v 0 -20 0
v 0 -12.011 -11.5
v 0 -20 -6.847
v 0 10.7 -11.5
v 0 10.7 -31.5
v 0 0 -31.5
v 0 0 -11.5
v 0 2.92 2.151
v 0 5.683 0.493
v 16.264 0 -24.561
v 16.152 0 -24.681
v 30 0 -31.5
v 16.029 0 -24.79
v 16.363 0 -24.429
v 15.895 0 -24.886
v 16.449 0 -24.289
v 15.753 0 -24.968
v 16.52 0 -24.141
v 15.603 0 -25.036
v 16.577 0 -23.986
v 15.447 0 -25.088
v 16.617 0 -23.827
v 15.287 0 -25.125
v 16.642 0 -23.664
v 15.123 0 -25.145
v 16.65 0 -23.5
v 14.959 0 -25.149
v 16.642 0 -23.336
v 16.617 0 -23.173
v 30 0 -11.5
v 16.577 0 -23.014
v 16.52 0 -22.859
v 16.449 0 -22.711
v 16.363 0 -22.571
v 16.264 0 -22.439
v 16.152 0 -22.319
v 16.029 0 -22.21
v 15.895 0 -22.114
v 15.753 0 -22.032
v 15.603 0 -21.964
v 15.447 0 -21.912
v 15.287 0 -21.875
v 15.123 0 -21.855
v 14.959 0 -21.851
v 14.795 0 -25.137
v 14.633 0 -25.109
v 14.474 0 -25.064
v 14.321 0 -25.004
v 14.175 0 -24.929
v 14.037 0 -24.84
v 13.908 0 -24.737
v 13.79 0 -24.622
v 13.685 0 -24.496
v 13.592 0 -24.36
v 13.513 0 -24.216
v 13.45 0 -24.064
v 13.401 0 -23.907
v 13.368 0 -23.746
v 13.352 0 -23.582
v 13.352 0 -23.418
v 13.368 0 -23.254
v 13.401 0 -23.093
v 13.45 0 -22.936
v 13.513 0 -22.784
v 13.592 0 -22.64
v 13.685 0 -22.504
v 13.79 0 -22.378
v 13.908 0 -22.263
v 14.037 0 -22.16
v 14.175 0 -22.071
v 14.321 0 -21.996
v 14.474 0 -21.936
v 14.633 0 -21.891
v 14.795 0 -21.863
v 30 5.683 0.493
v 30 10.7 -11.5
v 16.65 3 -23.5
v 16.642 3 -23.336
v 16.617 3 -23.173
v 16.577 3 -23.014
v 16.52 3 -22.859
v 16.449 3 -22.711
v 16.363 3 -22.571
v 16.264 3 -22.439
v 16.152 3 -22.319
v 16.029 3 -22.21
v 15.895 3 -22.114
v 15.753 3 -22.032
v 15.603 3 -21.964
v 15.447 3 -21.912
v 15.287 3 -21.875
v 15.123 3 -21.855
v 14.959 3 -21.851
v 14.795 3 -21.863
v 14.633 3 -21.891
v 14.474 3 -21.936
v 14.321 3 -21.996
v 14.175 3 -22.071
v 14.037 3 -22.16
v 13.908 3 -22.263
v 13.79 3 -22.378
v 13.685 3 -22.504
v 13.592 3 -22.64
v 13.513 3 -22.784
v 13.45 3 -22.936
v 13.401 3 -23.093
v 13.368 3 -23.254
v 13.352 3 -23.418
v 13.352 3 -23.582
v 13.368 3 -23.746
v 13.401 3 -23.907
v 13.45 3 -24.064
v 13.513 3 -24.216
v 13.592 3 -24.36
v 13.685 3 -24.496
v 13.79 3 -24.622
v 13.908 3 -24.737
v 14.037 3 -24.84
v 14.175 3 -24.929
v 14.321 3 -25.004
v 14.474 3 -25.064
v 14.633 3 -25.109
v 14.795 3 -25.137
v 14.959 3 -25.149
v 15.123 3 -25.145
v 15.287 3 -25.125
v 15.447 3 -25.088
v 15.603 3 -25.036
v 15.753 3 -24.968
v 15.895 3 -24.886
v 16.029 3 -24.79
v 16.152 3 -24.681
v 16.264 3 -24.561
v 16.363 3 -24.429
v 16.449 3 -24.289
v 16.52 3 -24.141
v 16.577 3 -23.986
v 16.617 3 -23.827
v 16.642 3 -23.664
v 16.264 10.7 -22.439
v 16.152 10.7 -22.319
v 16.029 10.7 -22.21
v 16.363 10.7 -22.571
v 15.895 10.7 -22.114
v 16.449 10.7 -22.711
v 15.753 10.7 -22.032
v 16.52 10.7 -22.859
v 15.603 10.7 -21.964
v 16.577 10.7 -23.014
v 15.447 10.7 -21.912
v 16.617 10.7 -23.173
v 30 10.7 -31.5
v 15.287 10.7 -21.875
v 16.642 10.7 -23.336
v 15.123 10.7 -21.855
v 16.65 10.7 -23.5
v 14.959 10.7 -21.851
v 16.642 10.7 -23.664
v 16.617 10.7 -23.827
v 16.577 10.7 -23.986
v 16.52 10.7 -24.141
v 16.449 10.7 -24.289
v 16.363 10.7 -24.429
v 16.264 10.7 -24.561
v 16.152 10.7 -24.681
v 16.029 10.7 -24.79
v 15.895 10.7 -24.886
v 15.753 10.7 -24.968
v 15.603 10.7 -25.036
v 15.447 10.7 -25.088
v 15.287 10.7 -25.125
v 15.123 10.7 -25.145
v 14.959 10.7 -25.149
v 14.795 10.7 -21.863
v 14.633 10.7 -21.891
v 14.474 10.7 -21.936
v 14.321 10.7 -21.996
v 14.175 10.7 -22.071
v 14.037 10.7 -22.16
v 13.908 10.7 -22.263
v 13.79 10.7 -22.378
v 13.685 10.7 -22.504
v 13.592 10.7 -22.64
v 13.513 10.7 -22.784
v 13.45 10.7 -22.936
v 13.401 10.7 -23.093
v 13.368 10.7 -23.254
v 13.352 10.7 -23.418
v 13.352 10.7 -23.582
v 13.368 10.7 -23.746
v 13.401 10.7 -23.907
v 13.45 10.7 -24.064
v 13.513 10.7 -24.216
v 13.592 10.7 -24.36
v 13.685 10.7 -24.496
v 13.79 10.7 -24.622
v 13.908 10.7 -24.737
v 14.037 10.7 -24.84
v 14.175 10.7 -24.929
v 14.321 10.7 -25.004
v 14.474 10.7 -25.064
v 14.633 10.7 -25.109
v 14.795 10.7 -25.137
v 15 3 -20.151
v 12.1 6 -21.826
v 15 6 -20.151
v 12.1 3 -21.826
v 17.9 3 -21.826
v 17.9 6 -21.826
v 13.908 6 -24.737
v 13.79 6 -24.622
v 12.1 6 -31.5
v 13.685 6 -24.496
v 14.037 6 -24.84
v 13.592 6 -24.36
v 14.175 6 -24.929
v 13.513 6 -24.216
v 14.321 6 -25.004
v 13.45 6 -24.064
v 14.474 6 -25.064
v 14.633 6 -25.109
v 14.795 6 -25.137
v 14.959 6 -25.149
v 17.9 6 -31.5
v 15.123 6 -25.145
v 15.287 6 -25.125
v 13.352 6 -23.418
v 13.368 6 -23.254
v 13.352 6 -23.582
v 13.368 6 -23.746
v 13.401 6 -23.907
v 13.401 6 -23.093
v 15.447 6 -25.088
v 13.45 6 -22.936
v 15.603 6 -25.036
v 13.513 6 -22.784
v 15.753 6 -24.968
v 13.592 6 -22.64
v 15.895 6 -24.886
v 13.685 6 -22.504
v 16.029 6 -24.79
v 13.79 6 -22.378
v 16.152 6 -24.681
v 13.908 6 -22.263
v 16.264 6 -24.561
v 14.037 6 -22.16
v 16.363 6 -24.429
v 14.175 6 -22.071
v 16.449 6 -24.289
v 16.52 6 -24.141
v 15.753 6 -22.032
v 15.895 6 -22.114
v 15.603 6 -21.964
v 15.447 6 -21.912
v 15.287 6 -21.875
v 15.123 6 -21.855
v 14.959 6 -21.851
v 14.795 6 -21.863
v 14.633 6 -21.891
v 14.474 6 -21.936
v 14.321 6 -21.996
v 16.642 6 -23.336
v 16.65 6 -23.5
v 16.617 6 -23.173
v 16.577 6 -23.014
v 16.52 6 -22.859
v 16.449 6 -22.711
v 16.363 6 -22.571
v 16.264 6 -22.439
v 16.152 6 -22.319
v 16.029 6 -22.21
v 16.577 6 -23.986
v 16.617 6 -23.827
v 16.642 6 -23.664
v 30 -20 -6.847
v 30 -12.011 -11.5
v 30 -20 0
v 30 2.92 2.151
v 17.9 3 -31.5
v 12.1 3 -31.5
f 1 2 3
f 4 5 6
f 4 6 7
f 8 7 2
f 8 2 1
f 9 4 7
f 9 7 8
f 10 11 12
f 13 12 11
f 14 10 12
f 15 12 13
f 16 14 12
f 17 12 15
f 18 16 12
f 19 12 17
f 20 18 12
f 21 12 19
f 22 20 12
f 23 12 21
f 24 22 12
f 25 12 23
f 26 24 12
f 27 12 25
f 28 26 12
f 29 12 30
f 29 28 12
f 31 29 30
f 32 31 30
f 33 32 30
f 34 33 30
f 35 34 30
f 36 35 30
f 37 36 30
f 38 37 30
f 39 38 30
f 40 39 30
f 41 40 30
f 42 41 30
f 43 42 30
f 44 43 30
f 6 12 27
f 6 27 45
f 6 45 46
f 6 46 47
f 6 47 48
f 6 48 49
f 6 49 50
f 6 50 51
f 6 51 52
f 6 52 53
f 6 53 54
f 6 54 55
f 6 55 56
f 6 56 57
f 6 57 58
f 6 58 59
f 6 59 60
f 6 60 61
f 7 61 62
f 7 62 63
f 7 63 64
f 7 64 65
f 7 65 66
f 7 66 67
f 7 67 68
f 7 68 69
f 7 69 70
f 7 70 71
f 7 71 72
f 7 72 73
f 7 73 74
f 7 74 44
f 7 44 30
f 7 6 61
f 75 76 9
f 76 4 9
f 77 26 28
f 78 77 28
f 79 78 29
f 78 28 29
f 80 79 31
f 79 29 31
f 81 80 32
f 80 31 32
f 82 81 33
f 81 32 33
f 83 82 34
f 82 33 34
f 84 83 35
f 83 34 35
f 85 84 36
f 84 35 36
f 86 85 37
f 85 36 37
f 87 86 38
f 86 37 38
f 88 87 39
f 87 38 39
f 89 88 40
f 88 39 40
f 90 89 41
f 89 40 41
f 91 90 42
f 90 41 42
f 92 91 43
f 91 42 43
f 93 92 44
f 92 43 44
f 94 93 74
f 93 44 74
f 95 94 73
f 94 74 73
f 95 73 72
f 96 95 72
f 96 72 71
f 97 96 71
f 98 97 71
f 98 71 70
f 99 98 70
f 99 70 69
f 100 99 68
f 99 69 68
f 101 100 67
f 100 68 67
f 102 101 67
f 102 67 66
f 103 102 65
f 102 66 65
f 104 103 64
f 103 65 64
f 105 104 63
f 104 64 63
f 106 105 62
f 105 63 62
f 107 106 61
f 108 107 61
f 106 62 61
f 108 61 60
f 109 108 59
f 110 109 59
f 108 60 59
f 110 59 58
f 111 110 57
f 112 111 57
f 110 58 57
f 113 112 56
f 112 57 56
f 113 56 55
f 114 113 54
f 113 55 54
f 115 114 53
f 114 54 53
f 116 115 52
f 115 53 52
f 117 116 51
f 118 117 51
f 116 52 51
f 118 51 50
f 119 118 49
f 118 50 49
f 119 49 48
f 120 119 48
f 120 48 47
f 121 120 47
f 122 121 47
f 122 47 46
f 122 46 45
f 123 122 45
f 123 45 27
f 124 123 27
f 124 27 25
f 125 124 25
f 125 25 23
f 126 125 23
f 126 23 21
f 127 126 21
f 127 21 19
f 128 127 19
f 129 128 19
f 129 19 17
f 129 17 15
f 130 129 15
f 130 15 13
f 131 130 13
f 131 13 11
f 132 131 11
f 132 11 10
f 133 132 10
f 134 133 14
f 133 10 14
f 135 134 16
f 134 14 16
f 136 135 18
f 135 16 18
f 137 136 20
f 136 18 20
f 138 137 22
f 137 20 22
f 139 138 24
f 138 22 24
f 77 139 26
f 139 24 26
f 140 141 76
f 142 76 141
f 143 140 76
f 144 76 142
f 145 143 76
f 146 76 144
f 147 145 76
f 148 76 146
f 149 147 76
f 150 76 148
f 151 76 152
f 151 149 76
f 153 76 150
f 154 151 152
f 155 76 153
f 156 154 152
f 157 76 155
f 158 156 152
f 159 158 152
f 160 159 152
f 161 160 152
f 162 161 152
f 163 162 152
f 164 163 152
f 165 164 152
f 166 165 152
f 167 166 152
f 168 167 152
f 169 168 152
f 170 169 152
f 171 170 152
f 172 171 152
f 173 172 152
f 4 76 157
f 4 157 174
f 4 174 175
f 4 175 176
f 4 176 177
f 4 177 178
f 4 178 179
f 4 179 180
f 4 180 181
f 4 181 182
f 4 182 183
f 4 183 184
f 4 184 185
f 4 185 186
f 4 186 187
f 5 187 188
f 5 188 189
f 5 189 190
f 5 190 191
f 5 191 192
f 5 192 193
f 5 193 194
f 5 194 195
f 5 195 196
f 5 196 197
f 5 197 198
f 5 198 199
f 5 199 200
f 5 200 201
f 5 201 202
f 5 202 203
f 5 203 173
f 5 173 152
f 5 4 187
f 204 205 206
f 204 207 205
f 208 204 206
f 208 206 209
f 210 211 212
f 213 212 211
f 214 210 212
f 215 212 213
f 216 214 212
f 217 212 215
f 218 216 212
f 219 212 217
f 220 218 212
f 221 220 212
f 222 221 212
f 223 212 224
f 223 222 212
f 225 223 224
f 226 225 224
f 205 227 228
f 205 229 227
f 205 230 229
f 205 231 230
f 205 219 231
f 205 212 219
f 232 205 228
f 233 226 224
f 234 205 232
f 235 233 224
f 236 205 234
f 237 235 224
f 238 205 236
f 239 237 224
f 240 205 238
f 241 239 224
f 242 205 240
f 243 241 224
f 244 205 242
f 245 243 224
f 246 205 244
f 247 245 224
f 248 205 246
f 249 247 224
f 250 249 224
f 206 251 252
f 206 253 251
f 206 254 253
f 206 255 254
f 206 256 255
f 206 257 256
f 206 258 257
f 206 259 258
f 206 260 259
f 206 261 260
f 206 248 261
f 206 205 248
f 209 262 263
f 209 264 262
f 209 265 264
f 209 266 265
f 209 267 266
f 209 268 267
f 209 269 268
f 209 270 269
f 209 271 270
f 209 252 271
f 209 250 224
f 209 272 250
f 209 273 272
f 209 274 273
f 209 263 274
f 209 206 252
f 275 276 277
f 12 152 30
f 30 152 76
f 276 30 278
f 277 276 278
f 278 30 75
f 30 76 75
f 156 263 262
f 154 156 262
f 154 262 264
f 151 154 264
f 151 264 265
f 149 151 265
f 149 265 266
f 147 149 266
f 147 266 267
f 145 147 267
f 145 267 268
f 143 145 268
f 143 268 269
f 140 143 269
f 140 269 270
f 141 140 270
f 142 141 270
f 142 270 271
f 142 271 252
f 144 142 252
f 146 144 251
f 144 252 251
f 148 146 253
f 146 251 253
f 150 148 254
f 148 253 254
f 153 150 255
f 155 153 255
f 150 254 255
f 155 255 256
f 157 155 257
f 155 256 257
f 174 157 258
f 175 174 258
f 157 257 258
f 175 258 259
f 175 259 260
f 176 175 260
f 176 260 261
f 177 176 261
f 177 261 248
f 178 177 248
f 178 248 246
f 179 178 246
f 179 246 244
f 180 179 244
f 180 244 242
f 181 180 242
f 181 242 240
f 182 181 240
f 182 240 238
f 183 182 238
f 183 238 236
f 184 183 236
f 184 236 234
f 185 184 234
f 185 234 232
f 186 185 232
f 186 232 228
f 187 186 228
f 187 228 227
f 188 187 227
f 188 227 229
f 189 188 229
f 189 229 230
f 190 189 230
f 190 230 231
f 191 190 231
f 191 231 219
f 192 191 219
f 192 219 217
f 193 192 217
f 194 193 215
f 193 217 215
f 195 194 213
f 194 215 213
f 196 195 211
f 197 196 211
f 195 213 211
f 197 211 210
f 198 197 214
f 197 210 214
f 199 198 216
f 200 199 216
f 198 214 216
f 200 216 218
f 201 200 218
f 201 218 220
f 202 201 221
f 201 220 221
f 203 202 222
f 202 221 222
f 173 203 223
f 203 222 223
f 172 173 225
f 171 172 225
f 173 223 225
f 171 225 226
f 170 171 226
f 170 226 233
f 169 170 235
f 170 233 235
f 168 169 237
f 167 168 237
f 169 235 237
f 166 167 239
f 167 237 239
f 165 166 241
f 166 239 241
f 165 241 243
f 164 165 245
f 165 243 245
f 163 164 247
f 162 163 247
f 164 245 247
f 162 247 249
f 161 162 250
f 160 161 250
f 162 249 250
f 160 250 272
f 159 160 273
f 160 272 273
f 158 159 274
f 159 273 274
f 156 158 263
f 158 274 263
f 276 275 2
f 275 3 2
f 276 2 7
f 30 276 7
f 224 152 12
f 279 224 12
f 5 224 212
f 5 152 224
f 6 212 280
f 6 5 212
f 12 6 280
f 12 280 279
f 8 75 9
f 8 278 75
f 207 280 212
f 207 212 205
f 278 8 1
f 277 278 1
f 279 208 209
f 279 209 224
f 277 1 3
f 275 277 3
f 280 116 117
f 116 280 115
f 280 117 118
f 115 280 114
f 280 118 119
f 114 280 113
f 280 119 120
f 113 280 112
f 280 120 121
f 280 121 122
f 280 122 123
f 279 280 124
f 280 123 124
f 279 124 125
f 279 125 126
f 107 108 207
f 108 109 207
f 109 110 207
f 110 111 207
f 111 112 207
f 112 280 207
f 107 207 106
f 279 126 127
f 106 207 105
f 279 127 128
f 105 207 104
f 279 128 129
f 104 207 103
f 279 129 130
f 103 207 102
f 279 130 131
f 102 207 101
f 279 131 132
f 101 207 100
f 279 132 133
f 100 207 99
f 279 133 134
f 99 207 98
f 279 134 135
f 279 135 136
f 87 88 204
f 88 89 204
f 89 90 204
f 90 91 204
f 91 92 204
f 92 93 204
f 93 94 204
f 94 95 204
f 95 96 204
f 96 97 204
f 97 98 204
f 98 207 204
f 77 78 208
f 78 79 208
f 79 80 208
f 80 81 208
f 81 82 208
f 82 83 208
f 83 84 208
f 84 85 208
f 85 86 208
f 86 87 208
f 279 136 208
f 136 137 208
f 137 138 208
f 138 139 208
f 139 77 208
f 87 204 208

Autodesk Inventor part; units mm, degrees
ref_plane "YZ Plane" through (0, 0, 0) normal (1, 0, 0) x (0, 1, 0)
ref_plane "XZ Plane" through (0, 0, 0) normal (0, 1, 0) x (-1, 0, 0)
sketch "Sketch1" plane through (0, 0, 0) normal (1, 0, 0) x (0, 1, 0)
  line L0 (0, 0) -> (10.7, 0)
  line L1 (10.7, 0) -> (10.7, -31.5)
  line L2 (10.7, -31.5) -> (0, -31.5)
  line L3 (0, -31.5) -> (0, 0)
  line L4 (0, 0) -> (-20, 0)
  line L5 (-20, 0) -> (-20, -11.5)
  line L6 (-20, -11.5) -> (0, -11.5)
  line L7 (0, -11.5) -> (0, 0)
  line L8 (-20, -6.8471) -> (-12.0113, -11.5)
  dimension "d0" = 10.7
  dimension "d1" = 11.5
  dimension "d2" = 20
  dimension "d4" = 20
extrude "Extrusion1" add sketch "Sketch1" along normal blind 30 contours L0 L1 L2 L3 | L3 L6 L8 L5 L4
sketch "Sketch3" plane through (0, 0, -31.5) normal (0, -1, 0) x (1, 0, 0)
  line L0 (0, 20) -> (0, 0) projected
  line L1 (0, 0) -> (30, 0) projected
  line L2 (30, 20) -> (30, 0) projected
  line L3 (0, 20) -> (30, 20) projected
  circle A0 centre (15, 8) radius 1.65
  line L4 (15, 0) -> (15, 9.65)
  point P0 (0, 31.5)
  dimension "d10" = 3.3
  dimension "d11" = 8
extrude "Extrusion3" cut sketch "Sketch3" against normal blind 40 contours A0 L4 | L4 A0
ref_plane "Work Plane1" through (0, 3, -31.5) normal (0, -1, 0) x (1, 0, 0)
sketch "Sketch4" plane through (0, 3, -31.5) normal (0, -1, 0) x (1, 0, 0)
  circle A0 centre (15, 8) radius 1.65 projected
  circle A1 centre (20, 8) radius 1.65 projected
  line L0 (15, 4.6514) -> (12.1, 6.3257)
  line L1 (12.1, 6.3257) -> (12.1, 9.6743)
  line L2 (12.1, 9.6743) -> (15, 11.3486)
  line L3 (15, 11.3486) -> (17.9, 9.6743)
  line L4 (17.9, 9.6743) -> (17.9, 6.3257)
  line L5 (17.9, 6.3257) -> (15, 4.6514)
  line L6 (17.9, 6.3257) -> (17.9, 0)
  line L7 (0, 0) -> (30, 0) projected
  line L8 (12.1, 6.3257) -> (12.1, 0)
  line L9 (17.9, 0) -> (12.1, 0)
  line L10 (0, 0) -> (30, 0) projected
  line L11 (15, 0) -> (15, 11.3486)
  circle A2 centre (15, 8) radius 1.65
  line L12 (15, 4.6514) -> (17.9, 6.3257)
  line L13 (17.9, 6.3257) -> (17.9, 9.6743)
  line L14 (17.9, 9.6743) -> (15, 11.3486)
  line L15 (15, 11.3486) -> (12.1, 9.6743)
  line L16 (12.1, 9.6743) -> (12.1, 6.3257)
  line L17 (12.1, 6.3257) -> (15, 4.6514)
  line L18 (12.1, 6.3257) -> (12.1, 0)
  line L19 (17.9, 6.3257) -> (17.9, 0)
  line L20 (12.1, 0) -> (17.9, 0)
  point P0 (0, 31.5)
  point P1 (40, 0)
  point P2 (12.1, 0)
  point P3 (17.9, 0)
  dimension "d16" = 5.8
extrude "Extrusion4" cut sketch "Sketch4" against normal blind 3 contours A0 L11 | A0 L11 L3 L4 L5 | L11 A0 | A0 L11 L0 L1 L2 | L11 L7 L8 L0 | L5 L6 L7 L11
sketch "Sketch5" plane through (0, 0, 0) normal (-1, 0, 0) x (0, 0, 1)
  line L0 (0, -20) -> (-6.8471, -20) projected
  line L1 (0, 10.7) -> (0, -20) projected
  line L2 (-31.5, 10.7) -> (0, 10.7) projected
  line L3 (-31.5, 0) -> (-31.5, 10.7) projected
  line L4 (-11.5, 0) -> (-31.5, 0) projected
  line L5 (-11.5, -12.0113) -> (-11.5, 0) projected
  line L6 (-6.8471, -20) -> (-11.5, -12.0113) projected
  line L7 (-11.5, 10.7) -> (2.3381, 4.9114)
  line L8 (2.3381, 4.9114) -> (0, -20)
  line L9 (-11.5, 0) -> (-11.5, 10.7)
  point P0 (0, 0)
  point P1 (0, 5.8894)
  dimension "d19" = 157.3
  dimension "d20" = 15
extrude "Extrusion5" add sketch "Sketch5" against normal up to surface (30 mm away) contours L1 L7 L8
chamfer "Chamfer1" distance 2 angle 45 1 edges at (15, 4.9114, 2.3381)
extrude "Extrusion6" cut sketch "Sketch5" against normal through all contours L7 L2 L1
properties part number "ESQUINA_RECTA_SUPERIOR" material "Steel, Mild, Welded"
